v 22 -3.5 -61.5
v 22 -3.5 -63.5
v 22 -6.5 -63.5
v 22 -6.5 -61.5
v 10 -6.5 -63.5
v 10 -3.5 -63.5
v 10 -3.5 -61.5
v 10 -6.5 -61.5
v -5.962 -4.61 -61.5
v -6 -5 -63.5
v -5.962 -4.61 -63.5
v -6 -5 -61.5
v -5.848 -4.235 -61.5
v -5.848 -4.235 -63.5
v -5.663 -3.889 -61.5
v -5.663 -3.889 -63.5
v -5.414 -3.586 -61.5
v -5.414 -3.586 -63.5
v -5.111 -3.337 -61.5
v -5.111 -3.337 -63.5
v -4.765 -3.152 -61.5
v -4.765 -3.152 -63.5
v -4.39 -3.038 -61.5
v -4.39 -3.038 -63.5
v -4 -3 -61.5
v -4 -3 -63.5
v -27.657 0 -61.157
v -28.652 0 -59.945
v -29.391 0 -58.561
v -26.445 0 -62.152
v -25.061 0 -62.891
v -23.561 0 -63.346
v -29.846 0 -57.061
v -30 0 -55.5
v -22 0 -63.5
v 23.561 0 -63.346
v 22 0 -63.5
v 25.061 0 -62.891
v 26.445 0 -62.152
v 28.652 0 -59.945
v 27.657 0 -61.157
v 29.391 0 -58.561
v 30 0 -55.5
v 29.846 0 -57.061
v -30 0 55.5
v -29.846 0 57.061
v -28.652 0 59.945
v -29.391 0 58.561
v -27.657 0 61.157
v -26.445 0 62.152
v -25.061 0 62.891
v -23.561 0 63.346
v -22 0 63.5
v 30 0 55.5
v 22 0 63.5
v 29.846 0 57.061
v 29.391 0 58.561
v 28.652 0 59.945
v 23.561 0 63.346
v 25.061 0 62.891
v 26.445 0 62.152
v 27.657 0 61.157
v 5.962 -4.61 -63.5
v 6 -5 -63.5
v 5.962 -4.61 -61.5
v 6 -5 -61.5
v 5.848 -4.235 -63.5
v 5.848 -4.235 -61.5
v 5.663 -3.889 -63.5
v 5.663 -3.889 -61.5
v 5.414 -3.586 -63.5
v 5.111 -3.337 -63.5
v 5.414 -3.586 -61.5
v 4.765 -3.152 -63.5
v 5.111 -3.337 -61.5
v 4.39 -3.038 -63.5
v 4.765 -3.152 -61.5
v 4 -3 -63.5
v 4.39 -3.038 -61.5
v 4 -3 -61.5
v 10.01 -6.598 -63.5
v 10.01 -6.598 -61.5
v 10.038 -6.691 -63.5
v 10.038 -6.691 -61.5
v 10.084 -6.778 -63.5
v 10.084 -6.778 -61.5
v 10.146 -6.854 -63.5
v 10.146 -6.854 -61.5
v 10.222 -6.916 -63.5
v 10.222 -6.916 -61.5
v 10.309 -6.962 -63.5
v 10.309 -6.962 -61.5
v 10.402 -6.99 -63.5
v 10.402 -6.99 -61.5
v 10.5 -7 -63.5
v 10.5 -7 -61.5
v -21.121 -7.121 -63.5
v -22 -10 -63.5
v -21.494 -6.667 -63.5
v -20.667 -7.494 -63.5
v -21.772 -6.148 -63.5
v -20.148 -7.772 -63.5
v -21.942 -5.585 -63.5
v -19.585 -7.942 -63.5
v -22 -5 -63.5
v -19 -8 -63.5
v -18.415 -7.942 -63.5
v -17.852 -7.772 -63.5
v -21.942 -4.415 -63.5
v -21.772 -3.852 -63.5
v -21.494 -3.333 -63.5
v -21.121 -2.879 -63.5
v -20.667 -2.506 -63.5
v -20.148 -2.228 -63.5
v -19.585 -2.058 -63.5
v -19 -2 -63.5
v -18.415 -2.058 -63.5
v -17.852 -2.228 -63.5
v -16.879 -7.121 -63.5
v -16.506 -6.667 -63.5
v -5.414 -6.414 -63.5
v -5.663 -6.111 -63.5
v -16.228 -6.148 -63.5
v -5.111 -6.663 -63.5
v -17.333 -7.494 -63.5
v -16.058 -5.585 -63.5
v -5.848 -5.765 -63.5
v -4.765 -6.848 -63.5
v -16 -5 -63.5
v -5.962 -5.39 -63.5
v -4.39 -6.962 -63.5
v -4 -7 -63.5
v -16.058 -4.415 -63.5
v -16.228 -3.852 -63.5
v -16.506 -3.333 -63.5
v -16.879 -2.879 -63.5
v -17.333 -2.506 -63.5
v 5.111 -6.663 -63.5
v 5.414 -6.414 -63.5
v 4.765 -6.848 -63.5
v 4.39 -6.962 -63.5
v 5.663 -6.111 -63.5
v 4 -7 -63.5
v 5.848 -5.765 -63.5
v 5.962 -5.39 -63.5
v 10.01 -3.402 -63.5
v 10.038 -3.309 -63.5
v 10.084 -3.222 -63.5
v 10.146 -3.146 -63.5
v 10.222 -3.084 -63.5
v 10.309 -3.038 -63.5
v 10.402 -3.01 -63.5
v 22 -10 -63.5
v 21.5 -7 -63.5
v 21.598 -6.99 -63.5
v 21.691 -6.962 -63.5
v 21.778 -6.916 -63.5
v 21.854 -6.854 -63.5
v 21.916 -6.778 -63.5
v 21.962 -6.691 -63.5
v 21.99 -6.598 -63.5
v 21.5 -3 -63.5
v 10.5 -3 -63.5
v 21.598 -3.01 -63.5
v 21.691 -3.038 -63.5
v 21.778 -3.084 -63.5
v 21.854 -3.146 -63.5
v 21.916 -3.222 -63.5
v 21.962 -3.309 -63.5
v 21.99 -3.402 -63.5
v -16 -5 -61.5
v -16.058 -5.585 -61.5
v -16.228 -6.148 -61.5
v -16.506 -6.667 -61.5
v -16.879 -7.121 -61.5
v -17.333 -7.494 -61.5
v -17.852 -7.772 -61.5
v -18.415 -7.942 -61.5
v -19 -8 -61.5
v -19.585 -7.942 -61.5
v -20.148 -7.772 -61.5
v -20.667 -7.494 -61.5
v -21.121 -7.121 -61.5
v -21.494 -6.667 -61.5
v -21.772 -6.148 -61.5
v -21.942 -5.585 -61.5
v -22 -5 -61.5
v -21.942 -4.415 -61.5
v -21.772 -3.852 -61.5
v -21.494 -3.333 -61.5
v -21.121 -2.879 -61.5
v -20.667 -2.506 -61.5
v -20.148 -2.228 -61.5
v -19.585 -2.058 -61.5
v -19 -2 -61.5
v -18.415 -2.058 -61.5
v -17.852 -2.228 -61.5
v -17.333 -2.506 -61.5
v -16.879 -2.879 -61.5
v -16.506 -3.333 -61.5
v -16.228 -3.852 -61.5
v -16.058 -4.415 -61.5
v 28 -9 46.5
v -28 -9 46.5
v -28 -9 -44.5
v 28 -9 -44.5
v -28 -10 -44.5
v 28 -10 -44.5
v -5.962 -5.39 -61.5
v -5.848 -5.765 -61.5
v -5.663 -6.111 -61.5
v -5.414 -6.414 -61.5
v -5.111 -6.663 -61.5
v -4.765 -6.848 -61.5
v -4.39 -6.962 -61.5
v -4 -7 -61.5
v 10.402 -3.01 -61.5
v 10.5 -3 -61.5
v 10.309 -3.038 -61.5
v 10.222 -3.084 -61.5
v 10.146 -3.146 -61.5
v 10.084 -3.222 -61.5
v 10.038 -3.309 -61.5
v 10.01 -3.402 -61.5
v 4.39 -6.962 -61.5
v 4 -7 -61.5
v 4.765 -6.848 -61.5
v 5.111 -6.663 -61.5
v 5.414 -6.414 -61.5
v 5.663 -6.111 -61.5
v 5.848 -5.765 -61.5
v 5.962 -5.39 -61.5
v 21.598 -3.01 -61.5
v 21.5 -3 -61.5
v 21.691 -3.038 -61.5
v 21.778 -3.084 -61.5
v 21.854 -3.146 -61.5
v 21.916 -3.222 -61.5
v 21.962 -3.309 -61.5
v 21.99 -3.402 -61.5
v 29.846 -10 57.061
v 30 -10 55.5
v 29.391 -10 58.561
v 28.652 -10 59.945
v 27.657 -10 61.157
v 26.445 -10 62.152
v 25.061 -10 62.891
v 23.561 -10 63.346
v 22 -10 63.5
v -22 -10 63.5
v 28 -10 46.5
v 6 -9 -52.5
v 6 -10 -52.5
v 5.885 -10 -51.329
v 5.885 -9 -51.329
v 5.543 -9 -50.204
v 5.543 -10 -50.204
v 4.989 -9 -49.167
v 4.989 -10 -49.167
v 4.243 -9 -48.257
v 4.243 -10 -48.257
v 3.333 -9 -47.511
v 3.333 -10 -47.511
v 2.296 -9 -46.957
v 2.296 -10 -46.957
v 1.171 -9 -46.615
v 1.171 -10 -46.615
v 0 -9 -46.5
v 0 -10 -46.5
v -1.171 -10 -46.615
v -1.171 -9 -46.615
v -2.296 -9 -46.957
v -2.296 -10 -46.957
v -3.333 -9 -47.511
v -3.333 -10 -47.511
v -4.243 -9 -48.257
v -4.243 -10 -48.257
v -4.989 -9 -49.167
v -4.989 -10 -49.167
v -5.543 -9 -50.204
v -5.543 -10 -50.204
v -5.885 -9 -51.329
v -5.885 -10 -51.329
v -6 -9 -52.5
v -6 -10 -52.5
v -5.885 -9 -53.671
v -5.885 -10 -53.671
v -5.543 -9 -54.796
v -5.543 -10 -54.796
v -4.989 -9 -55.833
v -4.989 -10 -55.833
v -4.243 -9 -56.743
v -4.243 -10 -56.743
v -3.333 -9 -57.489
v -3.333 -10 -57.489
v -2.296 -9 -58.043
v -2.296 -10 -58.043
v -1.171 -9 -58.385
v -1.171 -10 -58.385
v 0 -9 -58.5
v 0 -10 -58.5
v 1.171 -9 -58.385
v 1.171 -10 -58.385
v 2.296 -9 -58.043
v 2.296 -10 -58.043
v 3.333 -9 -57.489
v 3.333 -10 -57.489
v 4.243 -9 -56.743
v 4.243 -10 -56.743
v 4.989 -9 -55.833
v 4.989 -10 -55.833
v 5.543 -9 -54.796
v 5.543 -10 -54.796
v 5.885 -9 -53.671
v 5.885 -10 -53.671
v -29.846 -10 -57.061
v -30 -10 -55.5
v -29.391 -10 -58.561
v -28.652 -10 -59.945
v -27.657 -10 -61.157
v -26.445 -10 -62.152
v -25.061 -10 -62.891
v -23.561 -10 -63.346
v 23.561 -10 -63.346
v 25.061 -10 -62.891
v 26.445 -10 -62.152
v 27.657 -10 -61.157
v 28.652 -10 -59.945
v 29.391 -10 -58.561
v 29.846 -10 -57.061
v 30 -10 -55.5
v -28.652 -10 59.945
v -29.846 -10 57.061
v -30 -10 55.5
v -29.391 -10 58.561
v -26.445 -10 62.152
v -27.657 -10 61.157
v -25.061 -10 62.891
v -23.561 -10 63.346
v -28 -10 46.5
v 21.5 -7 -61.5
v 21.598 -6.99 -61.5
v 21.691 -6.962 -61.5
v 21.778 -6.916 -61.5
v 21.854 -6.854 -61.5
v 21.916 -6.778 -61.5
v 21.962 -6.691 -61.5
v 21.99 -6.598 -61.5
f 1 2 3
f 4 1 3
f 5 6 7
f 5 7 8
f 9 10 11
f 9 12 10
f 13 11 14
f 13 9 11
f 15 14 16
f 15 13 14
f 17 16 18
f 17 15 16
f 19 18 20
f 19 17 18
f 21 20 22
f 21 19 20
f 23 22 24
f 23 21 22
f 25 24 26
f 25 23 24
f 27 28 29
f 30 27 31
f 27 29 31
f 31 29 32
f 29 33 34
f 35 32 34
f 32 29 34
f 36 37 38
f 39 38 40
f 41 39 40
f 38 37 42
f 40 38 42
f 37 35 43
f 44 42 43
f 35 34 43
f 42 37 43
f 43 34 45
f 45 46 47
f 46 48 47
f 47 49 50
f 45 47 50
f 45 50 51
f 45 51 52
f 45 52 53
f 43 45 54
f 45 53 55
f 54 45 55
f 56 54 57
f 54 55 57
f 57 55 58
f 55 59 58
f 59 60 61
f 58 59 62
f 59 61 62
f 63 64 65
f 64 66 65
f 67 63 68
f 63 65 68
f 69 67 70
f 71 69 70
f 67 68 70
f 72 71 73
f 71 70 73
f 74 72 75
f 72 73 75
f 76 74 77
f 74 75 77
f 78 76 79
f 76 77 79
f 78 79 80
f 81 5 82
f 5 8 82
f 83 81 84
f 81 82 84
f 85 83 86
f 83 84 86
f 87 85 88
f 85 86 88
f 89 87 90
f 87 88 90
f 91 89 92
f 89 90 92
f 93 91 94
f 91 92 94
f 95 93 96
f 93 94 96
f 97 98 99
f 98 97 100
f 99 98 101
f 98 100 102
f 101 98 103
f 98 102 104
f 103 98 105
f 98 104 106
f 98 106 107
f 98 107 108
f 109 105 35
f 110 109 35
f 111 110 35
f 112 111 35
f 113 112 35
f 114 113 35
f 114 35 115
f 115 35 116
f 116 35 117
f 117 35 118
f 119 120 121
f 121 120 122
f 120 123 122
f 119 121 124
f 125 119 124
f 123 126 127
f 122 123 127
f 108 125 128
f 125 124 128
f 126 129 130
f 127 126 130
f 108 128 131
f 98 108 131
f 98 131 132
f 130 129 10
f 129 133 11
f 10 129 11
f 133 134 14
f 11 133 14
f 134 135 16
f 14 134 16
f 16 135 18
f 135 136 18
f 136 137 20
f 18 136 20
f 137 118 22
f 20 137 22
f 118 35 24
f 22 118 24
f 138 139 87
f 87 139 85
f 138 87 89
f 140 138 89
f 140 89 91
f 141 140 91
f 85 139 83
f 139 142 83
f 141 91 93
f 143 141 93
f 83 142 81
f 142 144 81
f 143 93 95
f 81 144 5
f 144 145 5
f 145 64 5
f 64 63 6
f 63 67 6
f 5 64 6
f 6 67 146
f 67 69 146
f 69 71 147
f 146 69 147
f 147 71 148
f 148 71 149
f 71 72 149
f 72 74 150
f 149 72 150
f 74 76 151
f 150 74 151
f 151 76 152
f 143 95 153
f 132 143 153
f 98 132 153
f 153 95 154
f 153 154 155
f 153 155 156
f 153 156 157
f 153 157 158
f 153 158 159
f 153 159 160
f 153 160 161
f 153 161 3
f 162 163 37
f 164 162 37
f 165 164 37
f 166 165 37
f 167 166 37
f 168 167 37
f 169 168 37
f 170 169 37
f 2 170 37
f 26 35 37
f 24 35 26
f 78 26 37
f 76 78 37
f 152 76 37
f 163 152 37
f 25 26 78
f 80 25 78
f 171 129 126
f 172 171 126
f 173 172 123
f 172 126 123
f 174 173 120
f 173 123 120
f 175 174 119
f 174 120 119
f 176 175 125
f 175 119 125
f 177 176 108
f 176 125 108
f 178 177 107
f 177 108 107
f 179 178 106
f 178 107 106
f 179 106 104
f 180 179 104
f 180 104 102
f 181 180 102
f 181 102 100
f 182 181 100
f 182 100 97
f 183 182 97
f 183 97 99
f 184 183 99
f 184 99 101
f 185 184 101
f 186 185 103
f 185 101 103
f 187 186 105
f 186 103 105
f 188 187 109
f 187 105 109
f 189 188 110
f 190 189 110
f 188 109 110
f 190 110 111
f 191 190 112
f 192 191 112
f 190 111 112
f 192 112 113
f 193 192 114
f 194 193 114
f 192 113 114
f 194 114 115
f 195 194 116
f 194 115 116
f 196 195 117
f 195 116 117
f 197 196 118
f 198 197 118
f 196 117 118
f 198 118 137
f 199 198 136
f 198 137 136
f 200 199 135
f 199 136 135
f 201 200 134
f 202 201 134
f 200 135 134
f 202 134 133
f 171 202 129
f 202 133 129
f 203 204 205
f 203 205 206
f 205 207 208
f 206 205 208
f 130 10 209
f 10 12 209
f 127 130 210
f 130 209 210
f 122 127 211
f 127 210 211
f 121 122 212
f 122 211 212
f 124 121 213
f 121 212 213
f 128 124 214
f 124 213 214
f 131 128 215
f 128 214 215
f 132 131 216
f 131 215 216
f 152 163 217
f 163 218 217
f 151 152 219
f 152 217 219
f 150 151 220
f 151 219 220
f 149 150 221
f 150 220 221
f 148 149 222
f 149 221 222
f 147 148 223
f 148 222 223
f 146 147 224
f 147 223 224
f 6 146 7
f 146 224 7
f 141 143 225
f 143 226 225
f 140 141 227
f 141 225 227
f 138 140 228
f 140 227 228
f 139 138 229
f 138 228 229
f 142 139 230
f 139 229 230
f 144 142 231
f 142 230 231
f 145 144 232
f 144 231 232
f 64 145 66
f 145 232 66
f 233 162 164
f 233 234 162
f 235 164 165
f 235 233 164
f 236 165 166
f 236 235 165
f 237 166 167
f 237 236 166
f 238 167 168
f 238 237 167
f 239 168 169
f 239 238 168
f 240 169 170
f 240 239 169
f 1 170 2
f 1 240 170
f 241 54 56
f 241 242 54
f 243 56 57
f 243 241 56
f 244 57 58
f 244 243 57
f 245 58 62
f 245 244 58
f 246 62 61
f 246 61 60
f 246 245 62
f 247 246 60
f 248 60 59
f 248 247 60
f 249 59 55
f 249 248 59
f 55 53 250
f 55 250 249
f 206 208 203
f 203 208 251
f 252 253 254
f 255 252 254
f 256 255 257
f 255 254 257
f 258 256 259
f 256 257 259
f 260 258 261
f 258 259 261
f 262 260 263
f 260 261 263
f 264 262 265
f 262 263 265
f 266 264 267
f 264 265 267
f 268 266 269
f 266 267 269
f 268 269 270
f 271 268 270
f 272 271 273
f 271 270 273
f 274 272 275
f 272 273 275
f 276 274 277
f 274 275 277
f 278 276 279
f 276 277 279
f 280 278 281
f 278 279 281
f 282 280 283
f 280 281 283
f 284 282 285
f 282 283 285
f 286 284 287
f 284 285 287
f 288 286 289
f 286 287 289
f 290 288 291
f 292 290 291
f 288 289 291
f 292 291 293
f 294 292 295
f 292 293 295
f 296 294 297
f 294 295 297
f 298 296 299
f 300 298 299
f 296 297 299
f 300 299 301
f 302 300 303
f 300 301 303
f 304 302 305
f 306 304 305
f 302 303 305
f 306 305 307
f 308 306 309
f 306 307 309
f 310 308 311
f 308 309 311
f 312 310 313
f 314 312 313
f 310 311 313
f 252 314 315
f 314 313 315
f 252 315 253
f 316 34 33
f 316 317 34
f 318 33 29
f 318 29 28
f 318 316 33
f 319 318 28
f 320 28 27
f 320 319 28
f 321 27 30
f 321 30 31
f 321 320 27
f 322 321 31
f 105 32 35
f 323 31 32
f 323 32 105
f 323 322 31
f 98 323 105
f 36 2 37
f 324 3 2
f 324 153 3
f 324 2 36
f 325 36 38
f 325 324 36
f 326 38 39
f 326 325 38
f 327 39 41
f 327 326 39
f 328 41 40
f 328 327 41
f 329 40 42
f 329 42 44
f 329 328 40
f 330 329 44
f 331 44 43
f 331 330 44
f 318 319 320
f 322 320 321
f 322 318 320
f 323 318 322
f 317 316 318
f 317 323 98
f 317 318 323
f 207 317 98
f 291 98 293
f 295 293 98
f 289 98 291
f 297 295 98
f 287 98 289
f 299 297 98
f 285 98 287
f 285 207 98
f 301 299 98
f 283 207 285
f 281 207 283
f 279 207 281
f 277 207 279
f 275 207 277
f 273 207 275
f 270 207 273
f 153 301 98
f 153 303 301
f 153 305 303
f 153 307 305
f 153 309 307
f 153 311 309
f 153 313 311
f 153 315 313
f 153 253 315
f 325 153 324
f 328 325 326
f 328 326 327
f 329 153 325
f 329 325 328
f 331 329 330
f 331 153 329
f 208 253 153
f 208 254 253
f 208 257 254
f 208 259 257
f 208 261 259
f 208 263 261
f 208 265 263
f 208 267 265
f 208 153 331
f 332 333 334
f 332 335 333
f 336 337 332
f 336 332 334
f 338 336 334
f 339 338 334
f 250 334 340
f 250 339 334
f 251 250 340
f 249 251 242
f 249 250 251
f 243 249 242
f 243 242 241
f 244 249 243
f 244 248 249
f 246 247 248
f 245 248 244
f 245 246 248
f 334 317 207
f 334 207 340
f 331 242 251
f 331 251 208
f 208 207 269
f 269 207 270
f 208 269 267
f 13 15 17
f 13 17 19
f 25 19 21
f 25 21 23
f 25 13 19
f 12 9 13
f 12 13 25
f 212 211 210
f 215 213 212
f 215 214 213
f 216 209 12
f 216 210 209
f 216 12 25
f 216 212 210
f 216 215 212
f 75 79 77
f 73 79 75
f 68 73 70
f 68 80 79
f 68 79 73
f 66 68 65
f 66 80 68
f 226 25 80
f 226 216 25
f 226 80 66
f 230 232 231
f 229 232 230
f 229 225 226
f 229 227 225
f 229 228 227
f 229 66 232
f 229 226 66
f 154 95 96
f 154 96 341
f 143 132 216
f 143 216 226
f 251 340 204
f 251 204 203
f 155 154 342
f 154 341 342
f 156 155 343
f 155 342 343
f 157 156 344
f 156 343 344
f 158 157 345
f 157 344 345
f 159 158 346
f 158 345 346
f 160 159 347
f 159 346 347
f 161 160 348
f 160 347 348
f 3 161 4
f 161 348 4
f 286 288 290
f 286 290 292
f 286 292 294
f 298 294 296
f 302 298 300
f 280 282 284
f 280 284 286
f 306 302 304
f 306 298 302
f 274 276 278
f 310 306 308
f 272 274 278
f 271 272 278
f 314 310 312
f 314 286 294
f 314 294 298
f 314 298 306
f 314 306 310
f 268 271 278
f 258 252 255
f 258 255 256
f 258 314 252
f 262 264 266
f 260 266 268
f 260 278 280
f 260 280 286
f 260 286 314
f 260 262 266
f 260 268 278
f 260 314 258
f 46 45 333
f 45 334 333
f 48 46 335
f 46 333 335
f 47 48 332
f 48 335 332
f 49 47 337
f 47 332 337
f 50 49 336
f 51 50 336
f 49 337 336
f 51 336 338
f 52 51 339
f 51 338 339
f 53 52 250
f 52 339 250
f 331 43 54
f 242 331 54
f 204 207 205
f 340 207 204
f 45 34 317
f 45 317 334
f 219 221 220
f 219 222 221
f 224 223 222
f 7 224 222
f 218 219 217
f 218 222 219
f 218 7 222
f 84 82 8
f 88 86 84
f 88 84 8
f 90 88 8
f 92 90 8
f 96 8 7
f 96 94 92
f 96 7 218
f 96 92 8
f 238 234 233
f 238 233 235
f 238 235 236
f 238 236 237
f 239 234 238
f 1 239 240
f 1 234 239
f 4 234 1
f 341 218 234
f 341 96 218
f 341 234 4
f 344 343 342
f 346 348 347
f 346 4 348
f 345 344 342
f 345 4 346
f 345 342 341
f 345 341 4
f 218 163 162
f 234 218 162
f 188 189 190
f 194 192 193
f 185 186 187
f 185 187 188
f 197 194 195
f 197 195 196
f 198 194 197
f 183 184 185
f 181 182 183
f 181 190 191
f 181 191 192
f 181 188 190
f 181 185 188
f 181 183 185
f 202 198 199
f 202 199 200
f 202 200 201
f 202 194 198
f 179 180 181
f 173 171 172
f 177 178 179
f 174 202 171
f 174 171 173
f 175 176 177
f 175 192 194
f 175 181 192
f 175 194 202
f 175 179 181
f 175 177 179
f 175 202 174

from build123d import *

# Parameters (mm, degrees)
F0_W     = 60
F0_H     = 127
F1_DEPTH = 10
F2_R     = 8
F3_R     = 6
F4_DEPTH = 1
F5_W     = 56
F5_H     = 91
F6_DEPTH = 1
F7_W     = 12
F7_H     = 4
F7_R     = 3
F8_DEPTH = 2
F9_R     = 1.99999
F10_R    = 0.5


# Not quite as in the source:
# - a fillet or chamfer is up to 0.001 mm smaller than in the source, because OpenCascade refuses the exact size


with BuildPart() as f1:
    # F0 (on Front) → F1 (new body)
    with BuildSketch(Plane.XZ):
        Rectangle(F0_W, F0_H)
    extrude(amount=F1_DEPTH)

    # F2
    f2_edges = [f1.edges().sort_by_distance(p)[0] for p in [
        (30, -5, 63.5),
        (-30, -5, 63.5),
        (30, -5, -63.5),
        (-30, -5, -63.5),
    ]]
    fillet(f2_edges, radius=F2_R)

    # F3 (on face) → F4 (cut)
    with BuildSketch(Plane.XZ.offset(10)):
        with Locations((0, -52.5)):
            Circle(F3_R)
    extrude(amount=-F4_DEPTH, mode=Mode.SUBTRACT)

    # F5 (on face) → F6 (cut)
    with BuildSketch(Plane.XZ.offset(10)):
        with Locations((0, 1)):
            Rectangle(F5_W, F5_H)
    extrude(amount=-F6_DEPTH, mode=Mode.SUBTRACT)

    # F7 (on face) → F8 (cut)
    with BuildSketch(Plane(origin=(0, 0, -63.5), x_dir=(1, 0, 0), z_dir=(0, 0, -1))):
        with Locations((0, 5)):
            Rectangle(F7_W, F7_H)
        with Locations((16, 5)):
            Rectangle(F7_W, F7_H)
        with Locations((-19, 5)):
            Circle(F7_R)
    extrude(amount=-F8_DEPTH, mode=Mode.SUBTRACT)

    # F9 (radius 2 in the source; OpenCascade refuses exactly that, so slightly less here)
    f9_edges = [f1.edges().sort_by_distance(p)[0] for p in [
        (-6, -7, -62.5),
        (-6, -3, -62.5),
        (6, -7, -62.5),
        (6, -3, -62.5),
    ]]
    fillet(f9_edges, radius=F9_R)

    # F10
    f10_edges = [f1.edges().sort_by_distance(p)[0] for p in [
        (10, -7, -62.5),
        (10, -3, -62.5),
        (22, -3, -62.5),
        (22, -7, -62.5),
    ]]
    fillet(f10_edges, radius=F10_R)


solid = f1.part
